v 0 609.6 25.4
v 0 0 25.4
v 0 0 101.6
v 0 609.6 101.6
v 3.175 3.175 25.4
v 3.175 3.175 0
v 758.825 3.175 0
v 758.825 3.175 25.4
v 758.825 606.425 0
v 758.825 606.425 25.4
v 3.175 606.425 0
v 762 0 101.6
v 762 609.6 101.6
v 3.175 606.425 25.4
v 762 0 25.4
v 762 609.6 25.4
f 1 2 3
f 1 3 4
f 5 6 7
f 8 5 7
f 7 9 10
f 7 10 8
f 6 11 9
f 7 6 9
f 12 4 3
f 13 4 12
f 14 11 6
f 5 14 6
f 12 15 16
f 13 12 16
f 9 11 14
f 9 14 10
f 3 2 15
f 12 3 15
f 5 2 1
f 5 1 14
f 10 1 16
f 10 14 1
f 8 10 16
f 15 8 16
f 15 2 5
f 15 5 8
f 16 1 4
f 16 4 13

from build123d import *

# Parameters (mm, degrees)
F0_W     = 762
F0_H     = 609.6
F1_DEPTH = 101.6
F2_W     = 755.65
F2_H     = 603.25
F3_DEPTH = 25.4


with BuildPart() as f1:
    # F0 (on Top) → F1 (new body)
    with BuildSketch(Plane.XY):
        with Locations((381, 304.8)):
            Rectangle(F0_W, F0_H)
    extrude(amount=F1_DEPTH)

    # F2 (on face) → F3 (cut)
    with BuildSketch(Plane(origin=(0, 0, 0), x_dir=(1, 0, 0), z_dir=(0, 0, -1))):
        Polygon((762, 0), (0, 0), (0, -3.175), (0, -606.425), (0, -609.6), (762, -609.6), (762, -606.425), (762, -3.175), align=None)
        with Locations((381, -304.8)):
            Rectangle(F2_W, F2_H, mode=Mode.SUBTRACT)
    extrude(amount=-F3_DEPTH, mode=Mode.SUBTRACT)


solid = f1.part
